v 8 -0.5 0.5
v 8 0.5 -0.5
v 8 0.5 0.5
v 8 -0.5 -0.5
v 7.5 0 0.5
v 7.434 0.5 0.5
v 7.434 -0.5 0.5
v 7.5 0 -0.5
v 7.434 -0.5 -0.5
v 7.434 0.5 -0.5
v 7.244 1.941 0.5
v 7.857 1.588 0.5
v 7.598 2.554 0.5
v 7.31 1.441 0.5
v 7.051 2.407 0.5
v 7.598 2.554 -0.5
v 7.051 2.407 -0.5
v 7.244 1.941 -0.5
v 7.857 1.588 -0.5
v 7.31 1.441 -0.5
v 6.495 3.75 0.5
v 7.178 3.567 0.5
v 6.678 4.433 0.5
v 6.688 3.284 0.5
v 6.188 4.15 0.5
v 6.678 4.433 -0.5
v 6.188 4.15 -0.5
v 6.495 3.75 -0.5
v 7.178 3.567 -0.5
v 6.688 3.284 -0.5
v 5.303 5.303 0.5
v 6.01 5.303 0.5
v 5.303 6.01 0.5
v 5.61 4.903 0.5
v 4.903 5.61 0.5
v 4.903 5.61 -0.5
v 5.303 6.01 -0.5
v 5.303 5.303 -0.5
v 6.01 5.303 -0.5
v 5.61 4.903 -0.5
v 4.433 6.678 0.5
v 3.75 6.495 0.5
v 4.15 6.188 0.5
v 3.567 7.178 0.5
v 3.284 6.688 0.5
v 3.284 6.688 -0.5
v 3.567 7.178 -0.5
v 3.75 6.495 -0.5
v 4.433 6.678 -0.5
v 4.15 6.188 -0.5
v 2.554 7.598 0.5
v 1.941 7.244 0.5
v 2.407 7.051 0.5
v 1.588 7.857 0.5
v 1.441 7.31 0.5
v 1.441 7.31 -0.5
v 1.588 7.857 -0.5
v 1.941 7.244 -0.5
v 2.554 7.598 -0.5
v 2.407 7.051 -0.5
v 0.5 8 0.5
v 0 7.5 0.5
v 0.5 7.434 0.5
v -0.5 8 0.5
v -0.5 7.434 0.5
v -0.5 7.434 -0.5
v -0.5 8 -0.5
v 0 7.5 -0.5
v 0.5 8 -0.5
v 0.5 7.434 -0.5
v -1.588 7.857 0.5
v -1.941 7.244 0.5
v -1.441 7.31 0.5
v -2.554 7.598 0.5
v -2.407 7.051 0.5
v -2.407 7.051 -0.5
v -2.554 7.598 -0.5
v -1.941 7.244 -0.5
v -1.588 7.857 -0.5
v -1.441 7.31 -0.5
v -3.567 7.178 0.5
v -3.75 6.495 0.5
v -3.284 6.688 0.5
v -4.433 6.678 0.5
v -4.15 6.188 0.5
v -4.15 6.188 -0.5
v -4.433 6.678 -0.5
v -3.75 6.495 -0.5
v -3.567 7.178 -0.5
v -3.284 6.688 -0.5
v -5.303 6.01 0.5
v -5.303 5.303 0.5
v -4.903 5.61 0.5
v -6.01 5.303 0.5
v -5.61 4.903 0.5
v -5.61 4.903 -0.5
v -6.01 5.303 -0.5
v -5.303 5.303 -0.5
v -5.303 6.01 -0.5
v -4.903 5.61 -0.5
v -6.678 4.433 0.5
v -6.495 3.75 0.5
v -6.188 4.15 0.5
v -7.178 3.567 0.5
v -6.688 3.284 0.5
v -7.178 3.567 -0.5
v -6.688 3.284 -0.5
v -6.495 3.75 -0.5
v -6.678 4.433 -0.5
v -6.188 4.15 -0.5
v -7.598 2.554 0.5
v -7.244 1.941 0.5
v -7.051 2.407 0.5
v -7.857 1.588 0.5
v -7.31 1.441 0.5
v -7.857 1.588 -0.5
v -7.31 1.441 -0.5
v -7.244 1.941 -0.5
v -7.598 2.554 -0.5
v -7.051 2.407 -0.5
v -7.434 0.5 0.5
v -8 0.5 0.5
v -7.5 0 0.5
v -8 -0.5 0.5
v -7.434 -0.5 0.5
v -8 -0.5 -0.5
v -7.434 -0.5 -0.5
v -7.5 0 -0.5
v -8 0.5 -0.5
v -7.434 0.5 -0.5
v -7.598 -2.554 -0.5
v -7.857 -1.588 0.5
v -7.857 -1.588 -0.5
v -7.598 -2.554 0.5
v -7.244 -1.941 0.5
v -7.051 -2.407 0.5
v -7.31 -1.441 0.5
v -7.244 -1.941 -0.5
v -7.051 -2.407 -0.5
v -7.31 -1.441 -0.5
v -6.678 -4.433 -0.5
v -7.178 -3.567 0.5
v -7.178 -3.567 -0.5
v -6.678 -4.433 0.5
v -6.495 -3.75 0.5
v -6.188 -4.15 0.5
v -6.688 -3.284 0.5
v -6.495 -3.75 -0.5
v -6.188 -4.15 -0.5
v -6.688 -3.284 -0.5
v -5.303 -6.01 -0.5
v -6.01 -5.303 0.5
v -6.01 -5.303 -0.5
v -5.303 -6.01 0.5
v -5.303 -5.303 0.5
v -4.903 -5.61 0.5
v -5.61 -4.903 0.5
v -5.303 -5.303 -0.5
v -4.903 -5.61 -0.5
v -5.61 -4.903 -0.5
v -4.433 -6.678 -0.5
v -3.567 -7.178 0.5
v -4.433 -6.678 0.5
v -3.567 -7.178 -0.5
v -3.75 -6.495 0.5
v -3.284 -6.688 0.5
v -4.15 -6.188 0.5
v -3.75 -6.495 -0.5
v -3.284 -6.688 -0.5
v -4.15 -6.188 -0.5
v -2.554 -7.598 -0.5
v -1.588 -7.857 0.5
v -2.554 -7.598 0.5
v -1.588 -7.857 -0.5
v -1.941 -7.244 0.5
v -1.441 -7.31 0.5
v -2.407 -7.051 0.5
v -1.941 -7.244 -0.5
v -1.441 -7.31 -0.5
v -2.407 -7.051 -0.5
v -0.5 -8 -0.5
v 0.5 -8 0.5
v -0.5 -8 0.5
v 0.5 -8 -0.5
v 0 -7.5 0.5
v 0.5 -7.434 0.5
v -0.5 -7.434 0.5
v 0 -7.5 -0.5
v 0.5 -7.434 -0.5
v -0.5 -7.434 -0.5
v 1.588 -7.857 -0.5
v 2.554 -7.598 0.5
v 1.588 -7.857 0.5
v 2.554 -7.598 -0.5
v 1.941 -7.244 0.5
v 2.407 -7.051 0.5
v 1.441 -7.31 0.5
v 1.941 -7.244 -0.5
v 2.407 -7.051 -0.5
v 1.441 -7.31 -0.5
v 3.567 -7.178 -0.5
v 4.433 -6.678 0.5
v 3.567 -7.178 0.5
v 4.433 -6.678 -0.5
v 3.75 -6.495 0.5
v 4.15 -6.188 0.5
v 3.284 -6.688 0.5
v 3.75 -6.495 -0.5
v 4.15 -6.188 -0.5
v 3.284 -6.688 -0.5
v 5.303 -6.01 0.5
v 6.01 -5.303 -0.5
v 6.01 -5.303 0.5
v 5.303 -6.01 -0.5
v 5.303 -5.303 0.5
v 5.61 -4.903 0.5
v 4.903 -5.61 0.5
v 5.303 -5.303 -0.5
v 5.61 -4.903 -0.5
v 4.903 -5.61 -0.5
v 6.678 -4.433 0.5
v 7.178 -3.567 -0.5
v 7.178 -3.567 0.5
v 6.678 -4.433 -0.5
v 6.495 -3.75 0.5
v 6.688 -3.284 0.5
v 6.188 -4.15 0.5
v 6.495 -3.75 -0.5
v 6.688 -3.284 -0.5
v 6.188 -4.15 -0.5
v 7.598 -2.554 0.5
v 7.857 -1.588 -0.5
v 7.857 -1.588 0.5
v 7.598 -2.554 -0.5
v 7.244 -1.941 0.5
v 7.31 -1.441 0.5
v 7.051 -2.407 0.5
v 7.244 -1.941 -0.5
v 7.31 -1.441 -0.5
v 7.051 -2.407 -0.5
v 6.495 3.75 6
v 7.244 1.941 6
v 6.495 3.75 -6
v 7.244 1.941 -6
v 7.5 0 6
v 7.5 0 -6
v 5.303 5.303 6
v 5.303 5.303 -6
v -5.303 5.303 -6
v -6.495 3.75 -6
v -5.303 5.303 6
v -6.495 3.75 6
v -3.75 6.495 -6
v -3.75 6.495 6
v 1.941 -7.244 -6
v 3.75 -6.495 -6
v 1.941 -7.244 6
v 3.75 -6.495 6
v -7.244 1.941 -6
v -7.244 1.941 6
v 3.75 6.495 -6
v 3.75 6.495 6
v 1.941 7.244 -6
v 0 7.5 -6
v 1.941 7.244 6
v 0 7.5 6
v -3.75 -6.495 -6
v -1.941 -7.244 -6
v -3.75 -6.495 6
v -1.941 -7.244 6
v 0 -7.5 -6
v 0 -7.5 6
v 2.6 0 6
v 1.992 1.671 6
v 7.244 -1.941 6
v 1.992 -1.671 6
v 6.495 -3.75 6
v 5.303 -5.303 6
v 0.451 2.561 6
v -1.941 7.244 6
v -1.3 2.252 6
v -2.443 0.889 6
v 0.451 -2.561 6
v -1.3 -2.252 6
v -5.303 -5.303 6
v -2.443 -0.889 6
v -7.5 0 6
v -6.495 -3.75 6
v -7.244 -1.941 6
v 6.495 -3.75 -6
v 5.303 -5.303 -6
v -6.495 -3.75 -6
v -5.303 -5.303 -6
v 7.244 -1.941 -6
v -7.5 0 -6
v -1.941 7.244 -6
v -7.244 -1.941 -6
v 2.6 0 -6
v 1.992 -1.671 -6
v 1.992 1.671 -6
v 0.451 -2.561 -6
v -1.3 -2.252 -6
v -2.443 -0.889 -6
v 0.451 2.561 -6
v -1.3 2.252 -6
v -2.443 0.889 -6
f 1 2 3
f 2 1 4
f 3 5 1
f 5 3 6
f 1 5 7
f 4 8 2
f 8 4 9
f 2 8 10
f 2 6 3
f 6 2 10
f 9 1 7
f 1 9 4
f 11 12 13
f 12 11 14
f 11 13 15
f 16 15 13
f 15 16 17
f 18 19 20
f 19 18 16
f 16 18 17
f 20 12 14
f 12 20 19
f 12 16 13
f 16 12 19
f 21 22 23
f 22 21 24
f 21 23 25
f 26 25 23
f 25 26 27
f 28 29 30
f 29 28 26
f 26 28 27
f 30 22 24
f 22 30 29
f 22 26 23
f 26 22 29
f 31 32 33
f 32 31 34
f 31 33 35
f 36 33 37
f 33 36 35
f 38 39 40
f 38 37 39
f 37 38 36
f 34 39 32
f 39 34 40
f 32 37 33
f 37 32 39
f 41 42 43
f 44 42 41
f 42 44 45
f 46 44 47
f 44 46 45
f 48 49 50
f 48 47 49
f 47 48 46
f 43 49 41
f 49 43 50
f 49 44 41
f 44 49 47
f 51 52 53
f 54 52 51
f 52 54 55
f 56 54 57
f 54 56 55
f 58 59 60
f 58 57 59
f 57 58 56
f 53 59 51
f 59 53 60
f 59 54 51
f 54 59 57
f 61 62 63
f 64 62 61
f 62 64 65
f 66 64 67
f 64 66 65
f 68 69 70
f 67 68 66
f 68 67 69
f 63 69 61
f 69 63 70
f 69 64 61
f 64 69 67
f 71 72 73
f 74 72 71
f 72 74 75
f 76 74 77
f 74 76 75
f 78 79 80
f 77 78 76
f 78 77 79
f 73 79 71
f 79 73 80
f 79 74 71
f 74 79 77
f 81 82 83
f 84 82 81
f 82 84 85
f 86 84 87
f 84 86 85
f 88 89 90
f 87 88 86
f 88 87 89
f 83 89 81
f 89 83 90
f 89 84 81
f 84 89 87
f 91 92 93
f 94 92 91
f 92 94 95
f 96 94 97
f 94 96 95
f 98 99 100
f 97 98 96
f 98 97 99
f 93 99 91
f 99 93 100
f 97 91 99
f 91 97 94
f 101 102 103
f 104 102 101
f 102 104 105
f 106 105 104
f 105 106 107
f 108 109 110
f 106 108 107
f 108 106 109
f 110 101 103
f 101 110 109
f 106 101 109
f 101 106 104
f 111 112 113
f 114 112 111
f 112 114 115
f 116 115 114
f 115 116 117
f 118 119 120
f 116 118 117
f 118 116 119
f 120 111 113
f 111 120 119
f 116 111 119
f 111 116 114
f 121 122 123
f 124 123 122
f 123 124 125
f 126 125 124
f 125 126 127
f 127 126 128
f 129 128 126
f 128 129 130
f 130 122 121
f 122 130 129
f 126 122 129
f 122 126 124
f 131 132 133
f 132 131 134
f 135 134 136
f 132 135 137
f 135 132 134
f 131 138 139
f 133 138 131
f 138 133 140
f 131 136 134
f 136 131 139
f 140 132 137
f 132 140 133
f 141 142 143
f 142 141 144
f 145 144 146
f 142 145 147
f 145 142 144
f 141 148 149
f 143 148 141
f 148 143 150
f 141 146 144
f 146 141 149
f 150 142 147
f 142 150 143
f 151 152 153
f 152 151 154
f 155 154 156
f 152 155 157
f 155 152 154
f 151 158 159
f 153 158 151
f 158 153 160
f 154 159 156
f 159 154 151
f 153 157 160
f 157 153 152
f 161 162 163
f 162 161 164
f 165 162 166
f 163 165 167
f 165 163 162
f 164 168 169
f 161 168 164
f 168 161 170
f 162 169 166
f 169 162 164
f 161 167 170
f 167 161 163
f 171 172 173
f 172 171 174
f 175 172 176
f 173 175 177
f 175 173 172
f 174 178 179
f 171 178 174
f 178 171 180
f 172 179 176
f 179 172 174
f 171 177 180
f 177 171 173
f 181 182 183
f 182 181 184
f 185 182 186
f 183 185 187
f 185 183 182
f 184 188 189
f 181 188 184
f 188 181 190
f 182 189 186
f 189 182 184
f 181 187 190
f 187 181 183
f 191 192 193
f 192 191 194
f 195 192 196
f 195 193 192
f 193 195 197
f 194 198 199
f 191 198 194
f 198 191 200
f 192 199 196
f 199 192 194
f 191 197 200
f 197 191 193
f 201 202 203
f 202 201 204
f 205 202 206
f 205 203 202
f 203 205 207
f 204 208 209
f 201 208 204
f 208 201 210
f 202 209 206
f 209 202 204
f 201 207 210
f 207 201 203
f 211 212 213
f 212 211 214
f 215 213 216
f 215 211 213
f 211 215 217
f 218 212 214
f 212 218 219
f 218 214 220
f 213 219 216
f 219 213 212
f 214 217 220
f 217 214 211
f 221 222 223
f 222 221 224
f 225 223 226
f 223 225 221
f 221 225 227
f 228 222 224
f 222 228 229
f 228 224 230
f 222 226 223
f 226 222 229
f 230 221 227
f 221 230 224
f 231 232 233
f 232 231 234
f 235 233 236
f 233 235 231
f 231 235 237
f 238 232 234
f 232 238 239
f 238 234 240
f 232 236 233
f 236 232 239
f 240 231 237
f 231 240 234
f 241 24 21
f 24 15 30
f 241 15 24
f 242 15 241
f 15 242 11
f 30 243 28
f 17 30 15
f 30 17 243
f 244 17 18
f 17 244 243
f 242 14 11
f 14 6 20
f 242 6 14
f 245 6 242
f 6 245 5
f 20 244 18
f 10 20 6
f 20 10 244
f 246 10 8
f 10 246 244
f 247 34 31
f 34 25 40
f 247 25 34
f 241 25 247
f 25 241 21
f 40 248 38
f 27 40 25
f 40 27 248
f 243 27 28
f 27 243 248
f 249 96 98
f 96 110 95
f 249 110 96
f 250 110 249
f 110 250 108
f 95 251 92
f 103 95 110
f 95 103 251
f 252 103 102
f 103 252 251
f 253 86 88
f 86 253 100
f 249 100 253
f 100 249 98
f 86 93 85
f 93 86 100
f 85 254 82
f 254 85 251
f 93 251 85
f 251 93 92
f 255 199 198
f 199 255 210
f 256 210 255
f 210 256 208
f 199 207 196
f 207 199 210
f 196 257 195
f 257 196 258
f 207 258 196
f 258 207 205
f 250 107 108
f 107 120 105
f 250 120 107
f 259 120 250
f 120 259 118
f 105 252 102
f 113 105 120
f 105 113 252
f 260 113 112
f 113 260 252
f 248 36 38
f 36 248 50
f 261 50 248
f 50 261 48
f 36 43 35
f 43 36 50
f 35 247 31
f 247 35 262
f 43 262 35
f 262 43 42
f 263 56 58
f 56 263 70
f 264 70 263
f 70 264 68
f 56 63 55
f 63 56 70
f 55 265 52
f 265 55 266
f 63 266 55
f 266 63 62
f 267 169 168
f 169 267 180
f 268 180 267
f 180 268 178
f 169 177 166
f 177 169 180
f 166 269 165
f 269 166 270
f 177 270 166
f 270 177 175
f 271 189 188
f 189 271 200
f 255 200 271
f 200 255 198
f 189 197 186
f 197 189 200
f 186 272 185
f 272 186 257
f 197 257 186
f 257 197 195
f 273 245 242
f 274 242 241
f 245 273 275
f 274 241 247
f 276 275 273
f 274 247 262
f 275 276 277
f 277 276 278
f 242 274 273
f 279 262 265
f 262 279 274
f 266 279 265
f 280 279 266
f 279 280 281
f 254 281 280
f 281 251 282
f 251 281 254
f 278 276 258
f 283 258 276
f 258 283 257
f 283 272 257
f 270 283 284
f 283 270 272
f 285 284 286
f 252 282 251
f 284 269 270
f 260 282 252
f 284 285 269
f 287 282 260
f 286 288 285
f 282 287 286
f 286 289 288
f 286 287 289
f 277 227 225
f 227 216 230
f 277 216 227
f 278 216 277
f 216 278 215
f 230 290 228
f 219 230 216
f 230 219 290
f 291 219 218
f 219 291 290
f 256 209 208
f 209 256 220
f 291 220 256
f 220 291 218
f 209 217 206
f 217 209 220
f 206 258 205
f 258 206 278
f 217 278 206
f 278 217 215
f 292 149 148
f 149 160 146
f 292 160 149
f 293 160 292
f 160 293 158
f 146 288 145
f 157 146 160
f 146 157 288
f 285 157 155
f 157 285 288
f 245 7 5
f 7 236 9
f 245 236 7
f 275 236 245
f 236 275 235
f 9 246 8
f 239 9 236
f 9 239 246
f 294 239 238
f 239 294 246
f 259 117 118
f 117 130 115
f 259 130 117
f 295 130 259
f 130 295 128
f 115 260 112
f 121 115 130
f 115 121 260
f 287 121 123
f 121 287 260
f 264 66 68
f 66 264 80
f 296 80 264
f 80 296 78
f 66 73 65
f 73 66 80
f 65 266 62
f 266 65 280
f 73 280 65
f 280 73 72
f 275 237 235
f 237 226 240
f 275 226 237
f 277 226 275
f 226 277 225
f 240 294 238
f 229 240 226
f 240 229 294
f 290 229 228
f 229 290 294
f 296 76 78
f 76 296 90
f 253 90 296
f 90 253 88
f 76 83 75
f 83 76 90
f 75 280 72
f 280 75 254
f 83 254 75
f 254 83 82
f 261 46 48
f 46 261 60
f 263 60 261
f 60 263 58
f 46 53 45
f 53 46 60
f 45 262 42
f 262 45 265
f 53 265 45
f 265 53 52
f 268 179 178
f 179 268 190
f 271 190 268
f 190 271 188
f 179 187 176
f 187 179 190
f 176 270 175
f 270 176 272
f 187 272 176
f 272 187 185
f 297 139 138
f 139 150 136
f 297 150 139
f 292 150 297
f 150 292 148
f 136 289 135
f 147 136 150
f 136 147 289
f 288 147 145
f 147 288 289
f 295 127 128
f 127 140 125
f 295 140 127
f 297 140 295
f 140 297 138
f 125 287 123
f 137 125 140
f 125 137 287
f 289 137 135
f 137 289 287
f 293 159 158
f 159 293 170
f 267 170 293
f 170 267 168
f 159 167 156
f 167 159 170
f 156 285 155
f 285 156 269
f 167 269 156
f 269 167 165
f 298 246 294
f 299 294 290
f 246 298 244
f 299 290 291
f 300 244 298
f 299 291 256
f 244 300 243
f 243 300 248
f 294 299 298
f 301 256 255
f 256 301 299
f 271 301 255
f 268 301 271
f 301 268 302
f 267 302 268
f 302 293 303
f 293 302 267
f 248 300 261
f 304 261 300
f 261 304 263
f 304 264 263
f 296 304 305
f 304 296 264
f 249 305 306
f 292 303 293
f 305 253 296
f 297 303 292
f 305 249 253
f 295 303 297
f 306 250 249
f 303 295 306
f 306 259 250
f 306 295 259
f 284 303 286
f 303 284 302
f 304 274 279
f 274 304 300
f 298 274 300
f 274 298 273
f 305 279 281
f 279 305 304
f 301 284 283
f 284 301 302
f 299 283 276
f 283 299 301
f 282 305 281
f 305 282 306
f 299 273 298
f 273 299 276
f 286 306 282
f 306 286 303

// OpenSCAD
// Parameters
outer_diameter_mm = 15; //[7.5:30:0.1]
length_mm = 12; //[6:24:0.1]
screw_diameter_mm = 6; //[3:12:0.1]
internal_thread_pitch_mm = 1; //[0.5:2:0.05]
internal_minor_diameter_mm = 5; //[4:6:0.05]
top_chamfer_height_mm = 1; //[0.5:2:0.05]
bottom_chamfer_height_mm = 1; //[0.5:2:0.05]
external_knurl_depth_mm = 0.5; //[0.2:1.2:0.05]
external_knurl_pitch_mm = 1; //[0.5:2.5:0.05]
knurl_count_around = 24; //[12:60:1]
knurl_ridge_width_mm = 1; //[0.5:2:0.05]
knurl_overlap_mm = 0.8; //[0.3:2:0.05]
bore_clearance_extra_mm = 0.2; //[0:0.6:0.05]
eps_mm = 0.2; //[0.05:0.5:0.05]

// Threaded Insert - complete geometry
module threaded_insert() {
  color([0.8, 0.6, 0.2]) { // Brass color
    difference() {
      union() {
        // Insert body
        cylinder(r=outer_diameter_mm/2, h=length_mm, center=true);

        // Knurl ridges
        for (i = [0:knurl_count_around-1]) {
          rotate([0, 0, i*360/knurl_count_around])
          translate([outer_diameter_mm/2 - knurl_overlap_mm + (external_knurl_depth_mm + knurl_overlap_mm)/2, 0, 0])
          cube([external_knurl_depth_mm + knurl_overlap_mm, knurl_ridge_width_mm, external_knurl_pitch_mm], center=true);
        }

        // Top entry chamfer
        translate([0, 0, length_mm/2 - top_chamfer_height_mm/2])
        cylinder(r1=outer_diameter_mm/2, r2=outer_diameter_mm/2 - top_chamfer_height_mm, h=top_chamfer_height_mm, center=true);

        // Bottom lead-in chamfer
        translate([0, 0, -length_mm/2 + bottom_chamfer_height_mm/2])
        cylinder(r1=outer_diameter_mm/2, r2=outer_diameter_mm/2 - bottom_chamfer_height_mm, h=bottom_chamfer_height_mm, center=true);
      }

      // Internal thread bore for M6
      cylinder(r=(internal_minor_diameter_mm + bore_clearance_extra_mm)/2, h=length_mm + 2*eps_mm, center=true);
    }
  }
}

// Assembly
module assembly() {
  threaded_insert();
}

assembly();
